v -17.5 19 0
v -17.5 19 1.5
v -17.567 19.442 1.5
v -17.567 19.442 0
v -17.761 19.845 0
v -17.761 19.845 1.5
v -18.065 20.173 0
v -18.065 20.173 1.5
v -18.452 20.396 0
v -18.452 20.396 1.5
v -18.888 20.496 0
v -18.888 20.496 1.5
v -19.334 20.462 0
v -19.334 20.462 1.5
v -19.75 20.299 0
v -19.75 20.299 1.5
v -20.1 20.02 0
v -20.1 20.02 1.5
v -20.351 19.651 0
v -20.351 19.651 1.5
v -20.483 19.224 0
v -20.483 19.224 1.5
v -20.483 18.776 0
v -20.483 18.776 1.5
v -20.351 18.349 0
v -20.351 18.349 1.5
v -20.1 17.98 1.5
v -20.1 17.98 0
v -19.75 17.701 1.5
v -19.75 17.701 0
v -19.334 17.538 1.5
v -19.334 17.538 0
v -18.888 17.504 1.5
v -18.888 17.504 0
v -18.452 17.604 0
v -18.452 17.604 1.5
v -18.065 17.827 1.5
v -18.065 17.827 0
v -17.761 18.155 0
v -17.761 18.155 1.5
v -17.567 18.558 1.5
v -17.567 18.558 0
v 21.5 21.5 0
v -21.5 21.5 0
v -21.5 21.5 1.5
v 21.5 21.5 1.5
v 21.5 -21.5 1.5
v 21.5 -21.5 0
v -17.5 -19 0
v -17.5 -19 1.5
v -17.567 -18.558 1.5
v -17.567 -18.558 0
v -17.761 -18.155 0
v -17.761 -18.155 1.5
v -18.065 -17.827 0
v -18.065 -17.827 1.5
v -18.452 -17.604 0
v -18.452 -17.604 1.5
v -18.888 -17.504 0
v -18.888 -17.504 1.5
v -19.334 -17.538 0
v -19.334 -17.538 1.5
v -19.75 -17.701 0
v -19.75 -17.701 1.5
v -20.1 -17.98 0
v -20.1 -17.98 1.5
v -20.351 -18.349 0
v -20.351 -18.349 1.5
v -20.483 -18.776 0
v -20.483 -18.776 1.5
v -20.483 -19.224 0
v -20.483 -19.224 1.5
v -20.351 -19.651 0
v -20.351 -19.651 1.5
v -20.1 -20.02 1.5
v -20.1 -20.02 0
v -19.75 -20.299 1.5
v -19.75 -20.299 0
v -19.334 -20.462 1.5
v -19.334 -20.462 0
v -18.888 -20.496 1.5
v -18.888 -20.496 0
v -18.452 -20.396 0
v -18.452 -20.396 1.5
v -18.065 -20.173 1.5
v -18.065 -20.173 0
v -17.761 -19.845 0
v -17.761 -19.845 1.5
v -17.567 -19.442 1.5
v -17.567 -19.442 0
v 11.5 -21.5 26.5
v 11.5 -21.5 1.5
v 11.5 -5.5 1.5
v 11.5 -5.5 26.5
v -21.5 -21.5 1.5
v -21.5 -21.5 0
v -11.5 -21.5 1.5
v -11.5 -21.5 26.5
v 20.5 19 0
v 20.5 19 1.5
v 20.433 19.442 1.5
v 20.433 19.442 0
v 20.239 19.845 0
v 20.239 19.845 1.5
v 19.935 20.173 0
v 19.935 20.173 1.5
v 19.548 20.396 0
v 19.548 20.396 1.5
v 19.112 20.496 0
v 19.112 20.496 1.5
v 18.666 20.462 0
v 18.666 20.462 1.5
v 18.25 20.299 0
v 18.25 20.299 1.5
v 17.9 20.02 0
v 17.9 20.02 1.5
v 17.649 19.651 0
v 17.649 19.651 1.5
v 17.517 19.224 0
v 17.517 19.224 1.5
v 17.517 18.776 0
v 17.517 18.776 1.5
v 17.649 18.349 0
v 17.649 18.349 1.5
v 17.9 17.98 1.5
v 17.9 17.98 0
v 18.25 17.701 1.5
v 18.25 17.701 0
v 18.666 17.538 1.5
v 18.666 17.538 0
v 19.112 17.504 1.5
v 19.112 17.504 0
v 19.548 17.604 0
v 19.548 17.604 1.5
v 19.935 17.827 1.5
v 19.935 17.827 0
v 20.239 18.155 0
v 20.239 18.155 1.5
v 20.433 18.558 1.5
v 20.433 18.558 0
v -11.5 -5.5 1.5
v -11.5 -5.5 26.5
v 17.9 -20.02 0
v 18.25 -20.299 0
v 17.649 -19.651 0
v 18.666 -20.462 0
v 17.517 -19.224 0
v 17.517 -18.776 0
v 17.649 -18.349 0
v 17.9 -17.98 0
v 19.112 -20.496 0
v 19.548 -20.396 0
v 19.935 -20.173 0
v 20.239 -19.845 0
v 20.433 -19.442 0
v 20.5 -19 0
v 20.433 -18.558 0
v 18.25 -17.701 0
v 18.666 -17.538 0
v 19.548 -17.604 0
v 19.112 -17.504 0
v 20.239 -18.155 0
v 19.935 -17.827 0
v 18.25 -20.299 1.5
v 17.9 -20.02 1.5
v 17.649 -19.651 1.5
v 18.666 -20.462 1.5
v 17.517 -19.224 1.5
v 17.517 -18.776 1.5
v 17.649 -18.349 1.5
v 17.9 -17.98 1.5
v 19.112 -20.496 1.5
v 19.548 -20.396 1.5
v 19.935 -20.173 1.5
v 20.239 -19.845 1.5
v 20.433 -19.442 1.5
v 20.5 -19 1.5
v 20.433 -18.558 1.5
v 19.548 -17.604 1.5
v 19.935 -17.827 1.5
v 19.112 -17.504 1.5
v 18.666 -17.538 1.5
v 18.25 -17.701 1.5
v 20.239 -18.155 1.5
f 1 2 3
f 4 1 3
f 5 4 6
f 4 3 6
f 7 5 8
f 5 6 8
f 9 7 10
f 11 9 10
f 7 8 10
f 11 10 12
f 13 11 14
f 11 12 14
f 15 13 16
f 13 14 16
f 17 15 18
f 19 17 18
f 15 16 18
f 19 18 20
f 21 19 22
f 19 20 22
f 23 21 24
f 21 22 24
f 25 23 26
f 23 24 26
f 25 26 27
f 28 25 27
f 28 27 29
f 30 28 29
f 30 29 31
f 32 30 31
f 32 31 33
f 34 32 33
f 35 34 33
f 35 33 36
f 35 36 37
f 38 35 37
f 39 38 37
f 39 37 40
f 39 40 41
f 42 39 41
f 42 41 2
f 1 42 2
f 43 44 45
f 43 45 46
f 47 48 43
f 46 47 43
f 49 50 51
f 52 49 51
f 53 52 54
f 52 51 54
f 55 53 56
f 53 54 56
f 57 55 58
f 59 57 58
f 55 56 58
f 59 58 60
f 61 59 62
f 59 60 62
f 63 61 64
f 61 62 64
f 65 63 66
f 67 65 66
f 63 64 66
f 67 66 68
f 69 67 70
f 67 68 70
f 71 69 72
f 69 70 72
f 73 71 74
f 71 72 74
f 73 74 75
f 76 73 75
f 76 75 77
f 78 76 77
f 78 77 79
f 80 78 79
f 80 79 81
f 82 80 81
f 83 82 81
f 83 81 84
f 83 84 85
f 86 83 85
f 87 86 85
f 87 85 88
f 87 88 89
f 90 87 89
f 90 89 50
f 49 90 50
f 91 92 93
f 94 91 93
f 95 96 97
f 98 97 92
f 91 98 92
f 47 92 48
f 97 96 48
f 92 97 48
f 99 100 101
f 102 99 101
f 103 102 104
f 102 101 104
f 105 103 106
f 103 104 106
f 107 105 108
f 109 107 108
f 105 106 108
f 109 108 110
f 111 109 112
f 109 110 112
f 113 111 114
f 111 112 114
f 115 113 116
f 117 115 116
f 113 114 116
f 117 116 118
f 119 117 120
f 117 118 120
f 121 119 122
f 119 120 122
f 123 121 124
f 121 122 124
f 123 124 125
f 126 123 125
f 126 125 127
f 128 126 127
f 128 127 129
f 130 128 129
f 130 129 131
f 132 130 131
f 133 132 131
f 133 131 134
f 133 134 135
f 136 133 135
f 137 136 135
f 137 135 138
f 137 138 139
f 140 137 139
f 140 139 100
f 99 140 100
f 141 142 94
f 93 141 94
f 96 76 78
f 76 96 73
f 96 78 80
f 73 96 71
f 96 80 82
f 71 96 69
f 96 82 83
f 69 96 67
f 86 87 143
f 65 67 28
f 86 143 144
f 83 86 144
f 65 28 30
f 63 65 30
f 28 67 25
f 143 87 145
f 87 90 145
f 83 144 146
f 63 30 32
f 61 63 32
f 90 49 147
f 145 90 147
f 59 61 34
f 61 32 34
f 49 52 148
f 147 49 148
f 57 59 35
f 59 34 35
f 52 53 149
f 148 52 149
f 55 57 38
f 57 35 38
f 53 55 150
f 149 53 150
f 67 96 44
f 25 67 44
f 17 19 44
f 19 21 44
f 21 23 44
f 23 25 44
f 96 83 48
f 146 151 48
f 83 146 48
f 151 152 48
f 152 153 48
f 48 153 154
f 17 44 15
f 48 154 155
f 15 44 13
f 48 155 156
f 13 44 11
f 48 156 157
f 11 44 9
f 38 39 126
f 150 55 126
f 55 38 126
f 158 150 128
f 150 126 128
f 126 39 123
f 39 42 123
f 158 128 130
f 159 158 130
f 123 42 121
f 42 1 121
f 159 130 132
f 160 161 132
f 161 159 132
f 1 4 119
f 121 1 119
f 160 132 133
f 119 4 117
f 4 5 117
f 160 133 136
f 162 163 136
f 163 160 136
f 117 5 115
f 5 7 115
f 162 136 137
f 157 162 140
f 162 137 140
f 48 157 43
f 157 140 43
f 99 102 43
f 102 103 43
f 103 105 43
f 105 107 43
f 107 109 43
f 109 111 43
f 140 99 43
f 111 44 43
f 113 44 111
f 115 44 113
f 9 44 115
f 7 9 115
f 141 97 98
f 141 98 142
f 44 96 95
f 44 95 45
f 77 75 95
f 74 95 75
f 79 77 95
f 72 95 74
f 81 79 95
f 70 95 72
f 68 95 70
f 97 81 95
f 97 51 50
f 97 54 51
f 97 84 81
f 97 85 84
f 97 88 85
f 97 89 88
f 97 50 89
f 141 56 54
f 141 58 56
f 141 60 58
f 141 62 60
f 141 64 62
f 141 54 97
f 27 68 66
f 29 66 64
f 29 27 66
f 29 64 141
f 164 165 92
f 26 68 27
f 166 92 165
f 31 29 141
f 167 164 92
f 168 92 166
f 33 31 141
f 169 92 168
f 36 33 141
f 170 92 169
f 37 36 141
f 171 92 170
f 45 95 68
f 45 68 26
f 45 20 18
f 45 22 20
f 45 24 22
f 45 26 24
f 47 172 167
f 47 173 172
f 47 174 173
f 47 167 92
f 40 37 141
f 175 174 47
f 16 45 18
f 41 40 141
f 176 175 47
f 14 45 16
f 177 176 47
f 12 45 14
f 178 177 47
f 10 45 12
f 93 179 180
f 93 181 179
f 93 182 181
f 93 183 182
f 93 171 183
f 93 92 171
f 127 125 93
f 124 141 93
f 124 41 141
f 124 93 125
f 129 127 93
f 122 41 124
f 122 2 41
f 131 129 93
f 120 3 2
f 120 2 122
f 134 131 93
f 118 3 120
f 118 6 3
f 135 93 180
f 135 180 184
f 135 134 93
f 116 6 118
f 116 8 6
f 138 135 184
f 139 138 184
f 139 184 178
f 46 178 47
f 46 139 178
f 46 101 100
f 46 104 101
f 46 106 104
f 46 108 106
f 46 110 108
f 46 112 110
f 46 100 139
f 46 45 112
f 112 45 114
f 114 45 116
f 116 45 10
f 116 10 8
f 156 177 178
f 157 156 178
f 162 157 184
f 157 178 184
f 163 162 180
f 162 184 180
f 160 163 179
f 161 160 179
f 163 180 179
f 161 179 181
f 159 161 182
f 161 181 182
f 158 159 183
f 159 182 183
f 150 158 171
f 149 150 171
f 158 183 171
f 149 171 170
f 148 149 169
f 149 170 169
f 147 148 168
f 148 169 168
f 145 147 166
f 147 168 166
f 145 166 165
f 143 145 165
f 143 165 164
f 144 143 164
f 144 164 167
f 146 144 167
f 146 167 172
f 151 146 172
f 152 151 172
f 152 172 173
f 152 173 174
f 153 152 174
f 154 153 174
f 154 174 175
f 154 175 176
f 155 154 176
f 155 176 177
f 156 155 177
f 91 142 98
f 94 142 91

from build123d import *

# Parameters (mm, degrees)
F0_W     = 43
F0_H     = 43
F1_DEPTH = 1.5
F2_W     = 23
F2_H     = 16
F3_DEPTH = 25
F4_R     = 1.5
F5_DEPTH = 1.501


with BuildPart() as f1:
    # F0 (on Top) → F1 (new body)
    with BuildSketch(Plane.XY):
        Rectangle(F0_W, F0_H)
    extrude(amount=F1_DEPTH)

    # F2 (on face) → F3 (join)
    with BuildSketch(Plane.XY.offset(1.5)):
        with Locations((0, -13.5)):
            Rectangle(F2_W, F2_H)
    extrude(amount=F3_DEPTH)

    # F4 (on face) → F5 (cut, through all)
    with BuildSketch(Plane.XY.offset(1.5)):
        with Locations((-19, -19)):
            Circle(F4_R)
        with Locations((19, -19)):
            Circle(F4_R)
        with Locations((-19, 19)):
            Circle(F4_R)
        with Locations((19, 19)):
            Circle(F4_R)
    extrude(amount=-F5_DEPTH, mode=Mode.SUBTRACT)


solid = f1.part
